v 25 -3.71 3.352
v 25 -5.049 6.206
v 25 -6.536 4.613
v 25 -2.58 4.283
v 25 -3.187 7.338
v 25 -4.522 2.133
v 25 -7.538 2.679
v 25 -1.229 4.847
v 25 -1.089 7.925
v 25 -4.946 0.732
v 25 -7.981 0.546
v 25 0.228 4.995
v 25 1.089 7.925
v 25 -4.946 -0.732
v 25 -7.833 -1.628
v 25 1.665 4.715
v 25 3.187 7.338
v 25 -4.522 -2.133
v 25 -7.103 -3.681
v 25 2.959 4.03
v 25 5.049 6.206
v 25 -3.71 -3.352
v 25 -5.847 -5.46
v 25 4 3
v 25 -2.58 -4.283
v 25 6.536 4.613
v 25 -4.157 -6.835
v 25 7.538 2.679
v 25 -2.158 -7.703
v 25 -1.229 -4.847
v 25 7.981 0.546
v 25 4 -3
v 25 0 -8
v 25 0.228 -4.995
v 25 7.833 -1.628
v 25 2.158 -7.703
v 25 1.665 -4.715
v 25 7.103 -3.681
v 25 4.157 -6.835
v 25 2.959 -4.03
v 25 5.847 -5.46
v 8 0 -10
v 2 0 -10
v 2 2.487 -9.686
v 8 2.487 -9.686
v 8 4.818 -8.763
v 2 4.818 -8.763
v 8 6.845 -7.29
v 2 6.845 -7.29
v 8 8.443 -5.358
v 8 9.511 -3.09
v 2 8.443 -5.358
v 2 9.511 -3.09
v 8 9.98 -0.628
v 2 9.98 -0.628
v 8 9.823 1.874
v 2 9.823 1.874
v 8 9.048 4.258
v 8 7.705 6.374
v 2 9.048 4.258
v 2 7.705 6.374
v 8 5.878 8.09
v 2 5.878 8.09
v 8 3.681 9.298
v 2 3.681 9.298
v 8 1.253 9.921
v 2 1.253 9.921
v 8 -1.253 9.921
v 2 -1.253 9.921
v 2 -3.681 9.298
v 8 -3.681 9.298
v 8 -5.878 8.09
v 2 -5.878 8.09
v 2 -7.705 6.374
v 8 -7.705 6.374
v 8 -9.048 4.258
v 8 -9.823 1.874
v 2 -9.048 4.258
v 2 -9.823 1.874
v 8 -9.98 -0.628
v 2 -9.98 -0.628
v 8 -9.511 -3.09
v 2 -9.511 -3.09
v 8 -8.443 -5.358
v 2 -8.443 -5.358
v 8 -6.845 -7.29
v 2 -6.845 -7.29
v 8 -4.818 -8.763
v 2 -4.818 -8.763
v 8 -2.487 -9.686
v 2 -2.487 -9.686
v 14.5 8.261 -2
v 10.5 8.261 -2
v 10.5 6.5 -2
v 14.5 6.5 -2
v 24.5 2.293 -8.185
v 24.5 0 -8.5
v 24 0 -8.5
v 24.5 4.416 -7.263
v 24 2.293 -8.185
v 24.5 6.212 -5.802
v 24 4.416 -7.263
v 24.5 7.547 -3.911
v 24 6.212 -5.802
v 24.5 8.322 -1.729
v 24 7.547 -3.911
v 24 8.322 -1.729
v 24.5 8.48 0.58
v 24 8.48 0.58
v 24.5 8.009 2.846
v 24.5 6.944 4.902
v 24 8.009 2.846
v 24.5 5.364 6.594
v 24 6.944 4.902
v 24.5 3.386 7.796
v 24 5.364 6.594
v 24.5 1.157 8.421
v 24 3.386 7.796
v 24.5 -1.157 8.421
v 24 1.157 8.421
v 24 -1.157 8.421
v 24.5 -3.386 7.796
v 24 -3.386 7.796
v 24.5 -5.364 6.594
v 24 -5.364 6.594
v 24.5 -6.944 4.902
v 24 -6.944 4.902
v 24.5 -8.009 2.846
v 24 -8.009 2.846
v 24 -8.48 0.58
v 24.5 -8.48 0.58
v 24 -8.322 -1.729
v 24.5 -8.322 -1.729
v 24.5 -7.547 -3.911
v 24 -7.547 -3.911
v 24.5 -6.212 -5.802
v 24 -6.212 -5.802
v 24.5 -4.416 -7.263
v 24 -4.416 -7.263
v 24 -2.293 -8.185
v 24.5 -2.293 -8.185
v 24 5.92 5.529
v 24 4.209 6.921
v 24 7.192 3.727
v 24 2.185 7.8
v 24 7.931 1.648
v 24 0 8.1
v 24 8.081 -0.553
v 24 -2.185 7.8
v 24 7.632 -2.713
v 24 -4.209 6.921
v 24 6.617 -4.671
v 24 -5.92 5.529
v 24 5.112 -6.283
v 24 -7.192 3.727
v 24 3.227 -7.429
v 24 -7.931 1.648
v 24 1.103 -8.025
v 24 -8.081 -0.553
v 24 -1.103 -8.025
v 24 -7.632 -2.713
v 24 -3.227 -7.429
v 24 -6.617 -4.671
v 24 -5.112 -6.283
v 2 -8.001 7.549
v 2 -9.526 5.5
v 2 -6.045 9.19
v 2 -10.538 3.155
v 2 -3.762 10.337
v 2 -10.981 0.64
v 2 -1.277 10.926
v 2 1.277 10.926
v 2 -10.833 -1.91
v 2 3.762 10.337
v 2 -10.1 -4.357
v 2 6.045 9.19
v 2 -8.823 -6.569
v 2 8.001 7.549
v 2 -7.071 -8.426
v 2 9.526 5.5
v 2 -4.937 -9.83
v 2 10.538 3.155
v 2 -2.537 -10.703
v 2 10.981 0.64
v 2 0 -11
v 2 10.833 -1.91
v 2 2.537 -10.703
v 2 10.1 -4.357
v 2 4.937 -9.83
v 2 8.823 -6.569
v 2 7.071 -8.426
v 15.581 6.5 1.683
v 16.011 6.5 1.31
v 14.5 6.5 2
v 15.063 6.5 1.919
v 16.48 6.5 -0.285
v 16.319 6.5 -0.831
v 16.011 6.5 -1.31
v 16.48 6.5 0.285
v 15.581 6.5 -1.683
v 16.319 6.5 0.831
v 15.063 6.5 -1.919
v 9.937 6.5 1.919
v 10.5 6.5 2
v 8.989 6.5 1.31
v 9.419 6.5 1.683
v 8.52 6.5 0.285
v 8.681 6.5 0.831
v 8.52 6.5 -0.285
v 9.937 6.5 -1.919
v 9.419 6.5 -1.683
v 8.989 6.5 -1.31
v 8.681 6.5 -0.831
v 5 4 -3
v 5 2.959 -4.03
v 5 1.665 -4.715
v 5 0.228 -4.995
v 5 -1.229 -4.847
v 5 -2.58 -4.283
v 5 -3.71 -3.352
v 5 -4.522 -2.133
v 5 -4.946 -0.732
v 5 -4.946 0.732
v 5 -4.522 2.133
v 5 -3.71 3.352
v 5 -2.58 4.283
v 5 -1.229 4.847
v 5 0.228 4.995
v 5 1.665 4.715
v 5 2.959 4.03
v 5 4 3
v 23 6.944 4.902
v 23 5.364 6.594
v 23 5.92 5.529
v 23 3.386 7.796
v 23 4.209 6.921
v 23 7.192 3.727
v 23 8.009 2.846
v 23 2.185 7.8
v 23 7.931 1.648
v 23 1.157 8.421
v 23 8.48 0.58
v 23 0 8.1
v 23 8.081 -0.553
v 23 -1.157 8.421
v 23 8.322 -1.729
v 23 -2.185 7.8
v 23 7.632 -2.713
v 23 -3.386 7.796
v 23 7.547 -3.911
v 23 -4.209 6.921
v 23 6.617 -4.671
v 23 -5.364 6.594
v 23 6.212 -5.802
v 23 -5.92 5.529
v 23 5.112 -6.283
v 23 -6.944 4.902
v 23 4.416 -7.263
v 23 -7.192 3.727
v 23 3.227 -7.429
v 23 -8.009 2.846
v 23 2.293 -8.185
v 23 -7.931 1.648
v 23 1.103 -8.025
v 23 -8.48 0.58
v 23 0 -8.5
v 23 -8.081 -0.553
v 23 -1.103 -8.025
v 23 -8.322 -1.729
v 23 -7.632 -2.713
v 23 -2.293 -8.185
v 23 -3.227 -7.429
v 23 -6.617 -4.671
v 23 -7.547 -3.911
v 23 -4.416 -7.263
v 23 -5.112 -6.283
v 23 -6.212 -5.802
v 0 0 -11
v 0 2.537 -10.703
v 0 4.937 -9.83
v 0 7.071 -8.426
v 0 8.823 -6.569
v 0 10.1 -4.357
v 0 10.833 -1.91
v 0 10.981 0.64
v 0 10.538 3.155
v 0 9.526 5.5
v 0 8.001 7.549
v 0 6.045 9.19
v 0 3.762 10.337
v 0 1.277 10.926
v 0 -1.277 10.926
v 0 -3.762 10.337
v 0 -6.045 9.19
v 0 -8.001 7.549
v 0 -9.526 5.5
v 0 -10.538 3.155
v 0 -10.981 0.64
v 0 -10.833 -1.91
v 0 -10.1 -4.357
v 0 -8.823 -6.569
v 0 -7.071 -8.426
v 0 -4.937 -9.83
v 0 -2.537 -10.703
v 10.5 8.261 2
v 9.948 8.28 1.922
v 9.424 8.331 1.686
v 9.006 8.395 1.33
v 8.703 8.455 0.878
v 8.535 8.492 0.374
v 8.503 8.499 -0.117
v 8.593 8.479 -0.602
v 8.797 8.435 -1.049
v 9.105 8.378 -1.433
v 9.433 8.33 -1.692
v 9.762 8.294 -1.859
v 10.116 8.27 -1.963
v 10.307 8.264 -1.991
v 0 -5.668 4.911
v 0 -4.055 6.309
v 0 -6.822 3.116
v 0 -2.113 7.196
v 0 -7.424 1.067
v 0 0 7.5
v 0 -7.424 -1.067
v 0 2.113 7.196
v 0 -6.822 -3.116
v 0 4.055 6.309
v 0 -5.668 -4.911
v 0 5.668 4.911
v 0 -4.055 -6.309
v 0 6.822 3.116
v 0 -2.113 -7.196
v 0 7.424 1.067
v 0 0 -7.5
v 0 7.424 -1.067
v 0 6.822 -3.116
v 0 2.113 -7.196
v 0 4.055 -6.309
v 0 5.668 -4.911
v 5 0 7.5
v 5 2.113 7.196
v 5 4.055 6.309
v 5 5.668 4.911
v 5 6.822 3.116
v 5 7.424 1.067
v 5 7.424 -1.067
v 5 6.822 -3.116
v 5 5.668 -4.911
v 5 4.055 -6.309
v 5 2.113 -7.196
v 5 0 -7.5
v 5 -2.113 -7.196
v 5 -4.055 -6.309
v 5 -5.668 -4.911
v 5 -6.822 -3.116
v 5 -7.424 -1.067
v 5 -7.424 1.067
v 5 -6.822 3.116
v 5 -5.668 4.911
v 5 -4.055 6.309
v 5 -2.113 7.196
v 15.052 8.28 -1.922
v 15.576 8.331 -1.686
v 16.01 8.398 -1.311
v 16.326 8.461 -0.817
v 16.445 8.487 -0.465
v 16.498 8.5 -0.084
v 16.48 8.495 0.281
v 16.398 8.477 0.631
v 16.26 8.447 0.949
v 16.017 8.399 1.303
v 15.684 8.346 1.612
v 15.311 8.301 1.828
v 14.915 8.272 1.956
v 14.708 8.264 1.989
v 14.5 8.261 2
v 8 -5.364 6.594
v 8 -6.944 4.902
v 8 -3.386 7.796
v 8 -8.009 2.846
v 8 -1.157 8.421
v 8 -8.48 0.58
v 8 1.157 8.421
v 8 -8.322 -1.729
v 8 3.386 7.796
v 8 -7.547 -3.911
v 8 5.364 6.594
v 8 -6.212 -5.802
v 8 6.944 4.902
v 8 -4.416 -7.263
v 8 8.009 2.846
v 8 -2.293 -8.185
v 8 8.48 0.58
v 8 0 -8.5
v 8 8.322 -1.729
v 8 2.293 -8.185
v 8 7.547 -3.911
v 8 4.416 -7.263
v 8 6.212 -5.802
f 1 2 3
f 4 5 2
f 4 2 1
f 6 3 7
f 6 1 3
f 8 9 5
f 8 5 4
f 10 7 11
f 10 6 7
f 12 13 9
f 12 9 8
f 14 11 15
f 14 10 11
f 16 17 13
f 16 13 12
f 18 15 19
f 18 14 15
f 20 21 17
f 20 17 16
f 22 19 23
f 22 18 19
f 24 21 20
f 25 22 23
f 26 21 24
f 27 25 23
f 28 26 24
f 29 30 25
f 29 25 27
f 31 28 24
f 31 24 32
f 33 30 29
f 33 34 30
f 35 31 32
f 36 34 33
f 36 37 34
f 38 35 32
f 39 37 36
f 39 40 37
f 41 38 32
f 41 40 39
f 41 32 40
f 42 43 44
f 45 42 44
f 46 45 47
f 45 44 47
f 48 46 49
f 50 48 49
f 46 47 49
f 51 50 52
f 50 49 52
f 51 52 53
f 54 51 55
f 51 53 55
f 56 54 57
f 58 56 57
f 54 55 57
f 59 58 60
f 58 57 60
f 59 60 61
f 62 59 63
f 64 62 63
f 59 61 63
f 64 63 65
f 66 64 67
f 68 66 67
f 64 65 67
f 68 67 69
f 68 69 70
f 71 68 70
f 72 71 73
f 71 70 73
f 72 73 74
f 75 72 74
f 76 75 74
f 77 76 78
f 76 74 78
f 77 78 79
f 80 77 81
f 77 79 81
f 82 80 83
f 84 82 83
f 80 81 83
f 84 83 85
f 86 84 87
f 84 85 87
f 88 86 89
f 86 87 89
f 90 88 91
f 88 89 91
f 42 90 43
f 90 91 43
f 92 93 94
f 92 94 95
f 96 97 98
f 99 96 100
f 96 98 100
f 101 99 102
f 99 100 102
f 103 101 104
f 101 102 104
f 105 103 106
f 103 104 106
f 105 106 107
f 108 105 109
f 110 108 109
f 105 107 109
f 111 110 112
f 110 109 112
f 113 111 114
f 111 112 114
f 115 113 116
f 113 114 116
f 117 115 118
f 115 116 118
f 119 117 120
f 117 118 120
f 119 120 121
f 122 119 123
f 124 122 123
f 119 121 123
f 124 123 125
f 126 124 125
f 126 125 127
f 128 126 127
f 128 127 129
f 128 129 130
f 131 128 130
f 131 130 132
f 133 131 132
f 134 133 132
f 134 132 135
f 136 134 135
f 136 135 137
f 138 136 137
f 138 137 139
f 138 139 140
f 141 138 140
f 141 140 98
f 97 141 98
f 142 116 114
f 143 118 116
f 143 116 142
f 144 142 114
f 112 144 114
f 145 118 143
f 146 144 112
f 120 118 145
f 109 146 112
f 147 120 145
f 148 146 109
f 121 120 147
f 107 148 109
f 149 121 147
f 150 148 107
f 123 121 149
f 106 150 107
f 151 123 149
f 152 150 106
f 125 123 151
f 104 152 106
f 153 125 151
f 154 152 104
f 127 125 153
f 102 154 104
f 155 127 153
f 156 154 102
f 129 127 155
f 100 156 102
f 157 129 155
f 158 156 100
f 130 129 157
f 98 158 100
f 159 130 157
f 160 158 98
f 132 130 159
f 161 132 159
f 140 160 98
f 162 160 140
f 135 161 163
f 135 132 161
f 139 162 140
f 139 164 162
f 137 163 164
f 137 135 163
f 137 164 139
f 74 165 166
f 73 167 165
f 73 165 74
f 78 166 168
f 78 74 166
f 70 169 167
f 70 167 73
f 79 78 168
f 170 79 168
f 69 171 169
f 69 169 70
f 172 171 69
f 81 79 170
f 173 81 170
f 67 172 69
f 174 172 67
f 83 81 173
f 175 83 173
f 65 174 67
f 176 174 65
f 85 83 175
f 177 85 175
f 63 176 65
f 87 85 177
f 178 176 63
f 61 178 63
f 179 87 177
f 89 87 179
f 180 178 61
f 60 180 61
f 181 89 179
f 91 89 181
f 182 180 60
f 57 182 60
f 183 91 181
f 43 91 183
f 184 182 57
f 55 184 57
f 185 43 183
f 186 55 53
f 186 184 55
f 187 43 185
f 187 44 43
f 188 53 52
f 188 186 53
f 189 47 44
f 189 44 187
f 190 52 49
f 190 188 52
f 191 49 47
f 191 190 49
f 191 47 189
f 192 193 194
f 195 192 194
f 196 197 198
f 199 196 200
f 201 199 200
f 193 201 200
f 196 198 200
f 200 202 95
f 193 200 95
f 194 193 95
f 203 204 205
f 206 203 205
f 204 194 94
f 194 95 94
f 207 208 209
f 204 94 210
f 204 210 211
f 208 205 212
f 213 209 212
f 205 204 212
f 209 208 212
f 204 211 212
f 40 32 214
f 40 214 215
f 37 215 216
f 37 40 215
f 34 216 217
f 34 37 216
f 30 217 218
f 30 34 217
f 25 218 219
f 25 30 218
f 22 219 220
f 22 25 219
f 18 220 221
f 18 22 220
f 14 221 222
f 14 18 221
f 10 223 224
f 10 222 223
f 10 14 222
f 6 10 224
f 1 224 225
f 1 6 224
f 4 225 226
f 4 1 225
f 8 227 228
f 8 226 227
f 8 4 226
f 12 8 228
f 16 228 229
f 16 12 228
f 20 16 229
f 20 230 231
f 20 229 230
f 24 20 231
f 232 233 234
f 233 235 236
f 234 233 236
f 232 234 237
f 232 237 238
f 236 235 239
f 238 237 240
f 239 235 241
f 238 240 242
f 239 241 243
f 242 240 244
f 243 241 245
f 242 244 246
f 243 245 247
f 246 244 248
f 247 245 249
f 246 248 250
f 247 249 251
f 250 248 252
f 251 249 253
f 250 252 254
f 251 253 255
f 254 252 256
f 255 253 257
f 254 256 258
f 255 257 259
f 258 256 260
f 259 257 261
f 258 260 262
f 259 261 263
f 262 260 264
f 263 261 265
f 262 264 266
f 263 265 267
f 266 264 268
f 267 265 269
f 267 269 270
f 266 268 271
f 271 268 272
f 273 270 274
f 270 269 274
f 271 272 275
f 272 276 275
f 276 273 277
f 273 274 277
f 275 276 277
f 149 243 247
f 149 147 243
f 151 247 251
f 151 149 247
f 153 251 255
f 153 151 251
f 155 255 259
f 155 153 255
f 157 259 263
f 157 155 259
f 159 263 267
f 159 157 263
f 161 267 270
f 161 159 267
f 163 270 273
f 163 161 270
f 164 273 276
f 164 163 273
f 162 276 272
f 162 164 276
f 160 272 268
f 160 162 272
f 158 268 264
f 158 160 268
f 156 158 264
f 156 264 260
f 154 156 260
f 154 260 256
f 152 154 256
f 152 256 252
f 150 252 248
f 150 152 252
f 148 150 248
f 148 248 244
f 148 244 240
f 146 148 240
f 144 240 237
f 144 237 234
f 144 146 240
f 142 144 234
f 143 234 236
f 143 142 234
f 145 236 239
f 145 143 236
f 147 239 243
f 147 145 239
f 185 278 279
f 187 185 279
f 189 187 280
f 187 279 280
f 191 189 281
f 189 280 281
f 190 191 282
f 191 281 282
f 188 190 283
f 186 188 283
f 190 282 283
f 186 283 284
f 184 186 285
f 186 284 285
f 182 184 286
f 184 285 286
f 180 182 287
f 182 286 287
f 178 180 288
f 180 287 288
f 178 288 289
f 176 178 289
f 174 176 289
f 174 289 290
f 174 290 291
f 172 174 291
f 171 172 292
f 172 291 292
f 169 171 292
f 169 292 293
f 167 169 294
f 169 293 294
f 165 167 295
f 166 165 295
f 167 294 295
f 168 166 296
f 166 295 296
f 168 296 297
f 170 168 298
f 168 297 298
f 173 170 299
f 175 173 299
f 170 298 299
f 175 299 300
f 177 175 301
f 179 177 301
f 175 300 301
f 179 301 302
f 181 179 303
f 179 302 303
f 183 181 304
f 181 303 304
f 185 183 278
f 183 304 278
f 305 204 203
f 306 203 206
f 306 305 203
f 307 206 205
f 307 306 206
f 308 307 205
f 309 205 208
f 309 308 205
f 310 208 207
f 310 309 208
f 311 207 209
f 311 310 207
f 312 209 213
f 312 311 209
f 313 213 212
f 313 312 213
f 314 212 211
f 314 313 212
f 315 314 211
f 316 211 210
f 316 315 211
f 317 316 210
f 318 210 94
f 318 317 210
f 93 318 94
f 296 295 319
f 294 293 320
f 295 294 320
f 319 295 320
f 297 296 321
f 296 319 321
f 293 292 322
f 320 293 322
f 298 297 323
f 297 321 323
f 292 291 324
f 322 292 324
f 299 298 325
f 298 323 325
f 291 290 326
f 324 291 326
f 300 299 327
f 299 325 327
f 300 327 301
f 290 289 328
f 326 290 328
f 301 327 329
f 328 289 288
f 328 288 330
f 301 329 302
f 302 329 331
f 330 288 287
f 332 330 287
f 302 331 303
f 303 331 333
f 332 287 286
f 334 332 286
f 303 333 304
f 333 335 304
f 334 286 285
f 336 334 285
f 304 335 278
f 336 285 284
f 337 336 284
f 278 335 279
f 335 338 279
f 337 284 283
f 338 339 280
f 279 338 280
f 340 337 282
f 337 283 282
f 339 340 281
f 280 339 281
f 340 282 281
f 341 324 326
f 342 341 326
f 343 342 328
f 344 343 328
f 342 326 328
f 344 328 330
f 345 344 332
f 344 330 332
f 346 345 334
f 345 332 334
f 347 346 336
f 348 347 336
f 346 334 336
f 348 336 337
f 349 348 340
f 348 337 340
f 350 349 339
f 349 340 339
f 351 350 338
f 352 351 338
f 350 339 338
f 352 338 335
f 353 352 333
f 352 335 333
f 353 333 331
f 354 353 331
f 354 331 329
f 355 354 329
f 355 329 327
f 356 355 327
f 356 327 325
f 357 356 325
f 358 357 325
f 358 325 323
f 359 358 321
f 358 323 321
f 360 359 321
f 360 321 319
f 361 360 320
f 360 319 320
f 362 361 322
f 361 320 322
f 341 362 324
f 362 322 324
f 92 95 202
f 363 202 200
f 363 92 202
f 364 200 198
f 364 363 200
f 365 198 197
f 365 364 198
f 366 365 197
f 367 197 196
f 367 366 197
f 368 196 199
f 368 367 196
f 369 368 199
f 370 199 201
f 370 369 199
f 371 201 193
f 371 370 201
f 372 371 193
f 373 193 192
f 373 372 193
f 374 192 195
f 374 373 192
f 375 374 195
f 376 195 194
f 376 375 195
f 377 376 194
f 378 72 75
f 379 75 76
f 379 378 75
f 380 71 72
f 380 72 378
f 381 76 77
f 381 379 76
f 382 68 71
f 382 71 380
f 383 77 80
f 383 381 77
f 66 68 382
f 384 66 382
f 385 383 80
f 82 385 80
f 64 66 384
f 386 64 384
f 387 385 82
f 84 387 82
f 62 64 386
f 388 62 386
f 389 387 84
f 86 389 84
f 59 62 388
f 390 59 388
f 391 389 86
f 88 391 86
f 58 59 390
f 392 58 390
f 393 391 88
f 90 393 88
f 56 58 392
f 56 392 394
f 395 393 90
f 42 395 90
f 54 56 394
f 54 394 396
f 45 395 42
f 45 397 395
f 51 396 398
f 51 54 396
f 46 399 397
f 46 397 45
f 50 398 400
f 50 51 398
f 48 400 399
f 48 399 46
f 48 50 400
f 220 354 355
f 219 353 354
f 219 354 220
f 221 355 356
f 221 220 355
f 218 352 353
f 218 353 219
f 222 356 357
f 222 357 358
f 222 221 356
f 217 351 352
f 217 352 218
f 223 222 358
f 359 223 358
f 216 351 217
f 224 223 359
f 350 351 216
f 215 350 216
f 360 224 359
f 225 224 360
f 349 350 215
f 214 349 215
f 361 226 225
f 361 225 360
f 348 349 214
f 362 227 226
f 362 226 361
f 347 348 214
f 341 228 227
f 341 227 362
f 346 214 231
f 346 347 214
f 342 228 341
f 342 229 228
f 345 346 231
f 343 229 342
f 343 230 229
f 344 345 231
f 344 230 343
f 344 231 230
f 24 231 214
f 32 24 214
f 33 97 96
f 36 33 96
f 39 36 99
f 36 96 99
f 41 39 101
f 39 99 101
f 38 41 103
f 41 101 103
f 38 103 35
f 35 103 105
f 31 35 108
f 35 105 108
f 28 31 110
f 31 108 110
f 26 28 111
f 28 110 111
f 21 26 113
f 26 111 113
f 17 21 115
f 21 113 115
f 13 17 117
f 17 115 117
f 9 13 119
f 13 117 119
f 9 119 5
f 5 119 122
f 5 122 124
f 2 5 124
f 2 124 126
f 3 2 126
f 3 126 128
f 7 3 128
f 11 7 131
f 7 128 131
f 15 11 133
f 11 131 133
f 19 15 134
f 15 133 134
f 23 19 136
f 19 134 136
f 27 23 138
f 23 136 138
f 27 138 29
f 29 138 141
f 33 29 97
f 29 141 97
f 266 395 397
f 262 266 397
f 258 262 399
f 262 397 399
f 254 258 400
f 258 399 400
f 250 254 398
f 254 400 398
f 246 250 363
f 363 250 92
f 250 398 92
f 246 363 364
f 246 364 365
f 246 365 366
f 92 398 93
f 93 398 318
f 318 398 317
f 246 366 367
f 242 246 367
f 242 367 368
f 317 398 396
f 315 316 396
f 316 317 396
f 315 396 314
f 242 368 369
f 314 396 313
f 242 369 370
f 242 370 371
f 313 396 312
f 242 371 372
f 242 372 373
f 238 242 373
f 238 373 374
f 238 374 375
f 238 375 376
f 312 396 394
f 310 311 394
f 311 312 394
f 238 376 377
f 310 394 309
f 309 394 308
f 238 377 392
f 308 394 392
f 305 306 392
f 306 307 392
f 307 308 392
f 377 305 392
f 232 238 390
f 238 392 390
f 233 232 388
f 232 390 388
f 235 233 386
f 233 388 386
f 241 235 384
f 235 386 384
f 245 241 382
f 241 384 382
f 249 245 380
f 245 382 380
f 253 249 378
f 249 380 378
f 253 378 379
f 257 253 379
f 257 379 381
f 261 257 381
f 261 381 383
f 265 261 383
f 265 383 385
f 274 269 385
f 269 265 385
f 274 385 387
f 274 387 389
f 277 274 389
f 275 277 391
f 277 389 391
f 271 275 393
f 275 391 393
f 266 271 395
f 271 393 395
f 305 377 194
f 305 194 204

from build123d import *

# Parameters (mm, degrees)
SKETCH_1_R          = 11
EXTRUDE_1_DEPTH     = 2
SKETCH_2_R          = 10
EXTRUDE_2_DEPTH     = 6
SKETCH_3_R          = 8.5
EXTRUDE_3_DEPTH     = 17
CUT_EXTRUDE_1_DEPTH = 2
CUT_EXTRUDE_2_DEPTH = 30.444863729
SKETCH_6_W          = 1
SKETCH_6_H          = 0.8
CHAMFER_1_SIZE      = 0.5
SKETCH_8_R          = 7.5
CUT_EXTRUDE_4_DEPTH = 5


with BuildPart() as part:
    # 草图1 → 凸台-拉伸1 (new body)
    with BuildSketch(Plane(origin=(0, 0, 0), x_dir=(0, 0, -1), z_dir=(1, 0, 0))):
        Circle(SKETCH_1_R)
    extrude(amount=EXTRUDE_1_DEPTH)

    # 草图2 → 凸台-拉伸2 (add)
    with BuildSketch(Plane(origin=(2, 0, 0), x_dir=(0, 0, -1), z_dir=(1, 0, 0))):
        Circle(SKETCH_2_R)
    extrude(amount=EXTRUDE_2_DEPTH)

    # 草图3 → 凸台-拉伸3 (add)
    with BuildSketch(Plane(origin=(8, 0, 0), x_dir=(0, 0, -1), z_dir=(1, 0, 0))):
        Circle(SKETCH_3_R)
    extrude(amount=EXTRUDE_3_DEPTH)

    # 草图4 → 切除-拉伸1 (cut)
    with BuildSketch(Plane(origin=(0, 8.5, 0), x_dir=(1, 0, 0), z_dir=(0, 1, 0))):
        with BuildLine():
            Line((10.5, 2), (14.5, 2))
            ThreePointArc((14.5, 2), (16.5, 0), (14.5, -2))
            Line((14.5, -2), (10.5, -2))
            ThreePointArc((10.5, -2), (8.5, 0), (10.5, 2))
        make_face()
    extrude(amount=-CUT_EXTRUDE_1_DEPTH, mode=Mode.SUBTRACT)

    # 草图5 → 切除-拉伸2 (cut, through all)
    with BuildSketch(Plane(origin=(25, 0, 0), x_dir=(0, 0, -1), z_dir=(1, 0, 0))):
        with BuildLine():
            Line((-3, 4), (3, 4))
            ThreePointArc((3, 4), (0, -5), (-3, 4))
        make_face()
    extrude(amount=-CUT_EXTRUDE_2_DEPTH, mode=Mode.SUBTRACT)

    # 草图6 → 切除-旋转1 (revolve, cut)
    with BuildSketch(Plane.XY):
        with Locations((23.5, 8.5)):
            Rectangle(SKETCH_6_W, SKETCH_6_H)
    revolve(axis=Axis((0, 0, 0), (1, 0, 0)), mode=Mode.SUBTRACT)

    # 倒角1
    chamfer_1_edges = [part.edges().sort_by_distance(p)[0] for p in [
        (25, 0, 8.5),
    ]]
    chamfer(chamfer_1_edges, length=CHAMFER_1_SIZE)

    # 草图8 → 切除-拉伸4 (cut)
    with BuildSketch(Plane.ZY):
        Circle(SKETCH_8_R)
    extrude(amount=-CUT_EXTRUDE_4_DEPTH, mode=Mode.SUBTRACT)


solid = part.part
